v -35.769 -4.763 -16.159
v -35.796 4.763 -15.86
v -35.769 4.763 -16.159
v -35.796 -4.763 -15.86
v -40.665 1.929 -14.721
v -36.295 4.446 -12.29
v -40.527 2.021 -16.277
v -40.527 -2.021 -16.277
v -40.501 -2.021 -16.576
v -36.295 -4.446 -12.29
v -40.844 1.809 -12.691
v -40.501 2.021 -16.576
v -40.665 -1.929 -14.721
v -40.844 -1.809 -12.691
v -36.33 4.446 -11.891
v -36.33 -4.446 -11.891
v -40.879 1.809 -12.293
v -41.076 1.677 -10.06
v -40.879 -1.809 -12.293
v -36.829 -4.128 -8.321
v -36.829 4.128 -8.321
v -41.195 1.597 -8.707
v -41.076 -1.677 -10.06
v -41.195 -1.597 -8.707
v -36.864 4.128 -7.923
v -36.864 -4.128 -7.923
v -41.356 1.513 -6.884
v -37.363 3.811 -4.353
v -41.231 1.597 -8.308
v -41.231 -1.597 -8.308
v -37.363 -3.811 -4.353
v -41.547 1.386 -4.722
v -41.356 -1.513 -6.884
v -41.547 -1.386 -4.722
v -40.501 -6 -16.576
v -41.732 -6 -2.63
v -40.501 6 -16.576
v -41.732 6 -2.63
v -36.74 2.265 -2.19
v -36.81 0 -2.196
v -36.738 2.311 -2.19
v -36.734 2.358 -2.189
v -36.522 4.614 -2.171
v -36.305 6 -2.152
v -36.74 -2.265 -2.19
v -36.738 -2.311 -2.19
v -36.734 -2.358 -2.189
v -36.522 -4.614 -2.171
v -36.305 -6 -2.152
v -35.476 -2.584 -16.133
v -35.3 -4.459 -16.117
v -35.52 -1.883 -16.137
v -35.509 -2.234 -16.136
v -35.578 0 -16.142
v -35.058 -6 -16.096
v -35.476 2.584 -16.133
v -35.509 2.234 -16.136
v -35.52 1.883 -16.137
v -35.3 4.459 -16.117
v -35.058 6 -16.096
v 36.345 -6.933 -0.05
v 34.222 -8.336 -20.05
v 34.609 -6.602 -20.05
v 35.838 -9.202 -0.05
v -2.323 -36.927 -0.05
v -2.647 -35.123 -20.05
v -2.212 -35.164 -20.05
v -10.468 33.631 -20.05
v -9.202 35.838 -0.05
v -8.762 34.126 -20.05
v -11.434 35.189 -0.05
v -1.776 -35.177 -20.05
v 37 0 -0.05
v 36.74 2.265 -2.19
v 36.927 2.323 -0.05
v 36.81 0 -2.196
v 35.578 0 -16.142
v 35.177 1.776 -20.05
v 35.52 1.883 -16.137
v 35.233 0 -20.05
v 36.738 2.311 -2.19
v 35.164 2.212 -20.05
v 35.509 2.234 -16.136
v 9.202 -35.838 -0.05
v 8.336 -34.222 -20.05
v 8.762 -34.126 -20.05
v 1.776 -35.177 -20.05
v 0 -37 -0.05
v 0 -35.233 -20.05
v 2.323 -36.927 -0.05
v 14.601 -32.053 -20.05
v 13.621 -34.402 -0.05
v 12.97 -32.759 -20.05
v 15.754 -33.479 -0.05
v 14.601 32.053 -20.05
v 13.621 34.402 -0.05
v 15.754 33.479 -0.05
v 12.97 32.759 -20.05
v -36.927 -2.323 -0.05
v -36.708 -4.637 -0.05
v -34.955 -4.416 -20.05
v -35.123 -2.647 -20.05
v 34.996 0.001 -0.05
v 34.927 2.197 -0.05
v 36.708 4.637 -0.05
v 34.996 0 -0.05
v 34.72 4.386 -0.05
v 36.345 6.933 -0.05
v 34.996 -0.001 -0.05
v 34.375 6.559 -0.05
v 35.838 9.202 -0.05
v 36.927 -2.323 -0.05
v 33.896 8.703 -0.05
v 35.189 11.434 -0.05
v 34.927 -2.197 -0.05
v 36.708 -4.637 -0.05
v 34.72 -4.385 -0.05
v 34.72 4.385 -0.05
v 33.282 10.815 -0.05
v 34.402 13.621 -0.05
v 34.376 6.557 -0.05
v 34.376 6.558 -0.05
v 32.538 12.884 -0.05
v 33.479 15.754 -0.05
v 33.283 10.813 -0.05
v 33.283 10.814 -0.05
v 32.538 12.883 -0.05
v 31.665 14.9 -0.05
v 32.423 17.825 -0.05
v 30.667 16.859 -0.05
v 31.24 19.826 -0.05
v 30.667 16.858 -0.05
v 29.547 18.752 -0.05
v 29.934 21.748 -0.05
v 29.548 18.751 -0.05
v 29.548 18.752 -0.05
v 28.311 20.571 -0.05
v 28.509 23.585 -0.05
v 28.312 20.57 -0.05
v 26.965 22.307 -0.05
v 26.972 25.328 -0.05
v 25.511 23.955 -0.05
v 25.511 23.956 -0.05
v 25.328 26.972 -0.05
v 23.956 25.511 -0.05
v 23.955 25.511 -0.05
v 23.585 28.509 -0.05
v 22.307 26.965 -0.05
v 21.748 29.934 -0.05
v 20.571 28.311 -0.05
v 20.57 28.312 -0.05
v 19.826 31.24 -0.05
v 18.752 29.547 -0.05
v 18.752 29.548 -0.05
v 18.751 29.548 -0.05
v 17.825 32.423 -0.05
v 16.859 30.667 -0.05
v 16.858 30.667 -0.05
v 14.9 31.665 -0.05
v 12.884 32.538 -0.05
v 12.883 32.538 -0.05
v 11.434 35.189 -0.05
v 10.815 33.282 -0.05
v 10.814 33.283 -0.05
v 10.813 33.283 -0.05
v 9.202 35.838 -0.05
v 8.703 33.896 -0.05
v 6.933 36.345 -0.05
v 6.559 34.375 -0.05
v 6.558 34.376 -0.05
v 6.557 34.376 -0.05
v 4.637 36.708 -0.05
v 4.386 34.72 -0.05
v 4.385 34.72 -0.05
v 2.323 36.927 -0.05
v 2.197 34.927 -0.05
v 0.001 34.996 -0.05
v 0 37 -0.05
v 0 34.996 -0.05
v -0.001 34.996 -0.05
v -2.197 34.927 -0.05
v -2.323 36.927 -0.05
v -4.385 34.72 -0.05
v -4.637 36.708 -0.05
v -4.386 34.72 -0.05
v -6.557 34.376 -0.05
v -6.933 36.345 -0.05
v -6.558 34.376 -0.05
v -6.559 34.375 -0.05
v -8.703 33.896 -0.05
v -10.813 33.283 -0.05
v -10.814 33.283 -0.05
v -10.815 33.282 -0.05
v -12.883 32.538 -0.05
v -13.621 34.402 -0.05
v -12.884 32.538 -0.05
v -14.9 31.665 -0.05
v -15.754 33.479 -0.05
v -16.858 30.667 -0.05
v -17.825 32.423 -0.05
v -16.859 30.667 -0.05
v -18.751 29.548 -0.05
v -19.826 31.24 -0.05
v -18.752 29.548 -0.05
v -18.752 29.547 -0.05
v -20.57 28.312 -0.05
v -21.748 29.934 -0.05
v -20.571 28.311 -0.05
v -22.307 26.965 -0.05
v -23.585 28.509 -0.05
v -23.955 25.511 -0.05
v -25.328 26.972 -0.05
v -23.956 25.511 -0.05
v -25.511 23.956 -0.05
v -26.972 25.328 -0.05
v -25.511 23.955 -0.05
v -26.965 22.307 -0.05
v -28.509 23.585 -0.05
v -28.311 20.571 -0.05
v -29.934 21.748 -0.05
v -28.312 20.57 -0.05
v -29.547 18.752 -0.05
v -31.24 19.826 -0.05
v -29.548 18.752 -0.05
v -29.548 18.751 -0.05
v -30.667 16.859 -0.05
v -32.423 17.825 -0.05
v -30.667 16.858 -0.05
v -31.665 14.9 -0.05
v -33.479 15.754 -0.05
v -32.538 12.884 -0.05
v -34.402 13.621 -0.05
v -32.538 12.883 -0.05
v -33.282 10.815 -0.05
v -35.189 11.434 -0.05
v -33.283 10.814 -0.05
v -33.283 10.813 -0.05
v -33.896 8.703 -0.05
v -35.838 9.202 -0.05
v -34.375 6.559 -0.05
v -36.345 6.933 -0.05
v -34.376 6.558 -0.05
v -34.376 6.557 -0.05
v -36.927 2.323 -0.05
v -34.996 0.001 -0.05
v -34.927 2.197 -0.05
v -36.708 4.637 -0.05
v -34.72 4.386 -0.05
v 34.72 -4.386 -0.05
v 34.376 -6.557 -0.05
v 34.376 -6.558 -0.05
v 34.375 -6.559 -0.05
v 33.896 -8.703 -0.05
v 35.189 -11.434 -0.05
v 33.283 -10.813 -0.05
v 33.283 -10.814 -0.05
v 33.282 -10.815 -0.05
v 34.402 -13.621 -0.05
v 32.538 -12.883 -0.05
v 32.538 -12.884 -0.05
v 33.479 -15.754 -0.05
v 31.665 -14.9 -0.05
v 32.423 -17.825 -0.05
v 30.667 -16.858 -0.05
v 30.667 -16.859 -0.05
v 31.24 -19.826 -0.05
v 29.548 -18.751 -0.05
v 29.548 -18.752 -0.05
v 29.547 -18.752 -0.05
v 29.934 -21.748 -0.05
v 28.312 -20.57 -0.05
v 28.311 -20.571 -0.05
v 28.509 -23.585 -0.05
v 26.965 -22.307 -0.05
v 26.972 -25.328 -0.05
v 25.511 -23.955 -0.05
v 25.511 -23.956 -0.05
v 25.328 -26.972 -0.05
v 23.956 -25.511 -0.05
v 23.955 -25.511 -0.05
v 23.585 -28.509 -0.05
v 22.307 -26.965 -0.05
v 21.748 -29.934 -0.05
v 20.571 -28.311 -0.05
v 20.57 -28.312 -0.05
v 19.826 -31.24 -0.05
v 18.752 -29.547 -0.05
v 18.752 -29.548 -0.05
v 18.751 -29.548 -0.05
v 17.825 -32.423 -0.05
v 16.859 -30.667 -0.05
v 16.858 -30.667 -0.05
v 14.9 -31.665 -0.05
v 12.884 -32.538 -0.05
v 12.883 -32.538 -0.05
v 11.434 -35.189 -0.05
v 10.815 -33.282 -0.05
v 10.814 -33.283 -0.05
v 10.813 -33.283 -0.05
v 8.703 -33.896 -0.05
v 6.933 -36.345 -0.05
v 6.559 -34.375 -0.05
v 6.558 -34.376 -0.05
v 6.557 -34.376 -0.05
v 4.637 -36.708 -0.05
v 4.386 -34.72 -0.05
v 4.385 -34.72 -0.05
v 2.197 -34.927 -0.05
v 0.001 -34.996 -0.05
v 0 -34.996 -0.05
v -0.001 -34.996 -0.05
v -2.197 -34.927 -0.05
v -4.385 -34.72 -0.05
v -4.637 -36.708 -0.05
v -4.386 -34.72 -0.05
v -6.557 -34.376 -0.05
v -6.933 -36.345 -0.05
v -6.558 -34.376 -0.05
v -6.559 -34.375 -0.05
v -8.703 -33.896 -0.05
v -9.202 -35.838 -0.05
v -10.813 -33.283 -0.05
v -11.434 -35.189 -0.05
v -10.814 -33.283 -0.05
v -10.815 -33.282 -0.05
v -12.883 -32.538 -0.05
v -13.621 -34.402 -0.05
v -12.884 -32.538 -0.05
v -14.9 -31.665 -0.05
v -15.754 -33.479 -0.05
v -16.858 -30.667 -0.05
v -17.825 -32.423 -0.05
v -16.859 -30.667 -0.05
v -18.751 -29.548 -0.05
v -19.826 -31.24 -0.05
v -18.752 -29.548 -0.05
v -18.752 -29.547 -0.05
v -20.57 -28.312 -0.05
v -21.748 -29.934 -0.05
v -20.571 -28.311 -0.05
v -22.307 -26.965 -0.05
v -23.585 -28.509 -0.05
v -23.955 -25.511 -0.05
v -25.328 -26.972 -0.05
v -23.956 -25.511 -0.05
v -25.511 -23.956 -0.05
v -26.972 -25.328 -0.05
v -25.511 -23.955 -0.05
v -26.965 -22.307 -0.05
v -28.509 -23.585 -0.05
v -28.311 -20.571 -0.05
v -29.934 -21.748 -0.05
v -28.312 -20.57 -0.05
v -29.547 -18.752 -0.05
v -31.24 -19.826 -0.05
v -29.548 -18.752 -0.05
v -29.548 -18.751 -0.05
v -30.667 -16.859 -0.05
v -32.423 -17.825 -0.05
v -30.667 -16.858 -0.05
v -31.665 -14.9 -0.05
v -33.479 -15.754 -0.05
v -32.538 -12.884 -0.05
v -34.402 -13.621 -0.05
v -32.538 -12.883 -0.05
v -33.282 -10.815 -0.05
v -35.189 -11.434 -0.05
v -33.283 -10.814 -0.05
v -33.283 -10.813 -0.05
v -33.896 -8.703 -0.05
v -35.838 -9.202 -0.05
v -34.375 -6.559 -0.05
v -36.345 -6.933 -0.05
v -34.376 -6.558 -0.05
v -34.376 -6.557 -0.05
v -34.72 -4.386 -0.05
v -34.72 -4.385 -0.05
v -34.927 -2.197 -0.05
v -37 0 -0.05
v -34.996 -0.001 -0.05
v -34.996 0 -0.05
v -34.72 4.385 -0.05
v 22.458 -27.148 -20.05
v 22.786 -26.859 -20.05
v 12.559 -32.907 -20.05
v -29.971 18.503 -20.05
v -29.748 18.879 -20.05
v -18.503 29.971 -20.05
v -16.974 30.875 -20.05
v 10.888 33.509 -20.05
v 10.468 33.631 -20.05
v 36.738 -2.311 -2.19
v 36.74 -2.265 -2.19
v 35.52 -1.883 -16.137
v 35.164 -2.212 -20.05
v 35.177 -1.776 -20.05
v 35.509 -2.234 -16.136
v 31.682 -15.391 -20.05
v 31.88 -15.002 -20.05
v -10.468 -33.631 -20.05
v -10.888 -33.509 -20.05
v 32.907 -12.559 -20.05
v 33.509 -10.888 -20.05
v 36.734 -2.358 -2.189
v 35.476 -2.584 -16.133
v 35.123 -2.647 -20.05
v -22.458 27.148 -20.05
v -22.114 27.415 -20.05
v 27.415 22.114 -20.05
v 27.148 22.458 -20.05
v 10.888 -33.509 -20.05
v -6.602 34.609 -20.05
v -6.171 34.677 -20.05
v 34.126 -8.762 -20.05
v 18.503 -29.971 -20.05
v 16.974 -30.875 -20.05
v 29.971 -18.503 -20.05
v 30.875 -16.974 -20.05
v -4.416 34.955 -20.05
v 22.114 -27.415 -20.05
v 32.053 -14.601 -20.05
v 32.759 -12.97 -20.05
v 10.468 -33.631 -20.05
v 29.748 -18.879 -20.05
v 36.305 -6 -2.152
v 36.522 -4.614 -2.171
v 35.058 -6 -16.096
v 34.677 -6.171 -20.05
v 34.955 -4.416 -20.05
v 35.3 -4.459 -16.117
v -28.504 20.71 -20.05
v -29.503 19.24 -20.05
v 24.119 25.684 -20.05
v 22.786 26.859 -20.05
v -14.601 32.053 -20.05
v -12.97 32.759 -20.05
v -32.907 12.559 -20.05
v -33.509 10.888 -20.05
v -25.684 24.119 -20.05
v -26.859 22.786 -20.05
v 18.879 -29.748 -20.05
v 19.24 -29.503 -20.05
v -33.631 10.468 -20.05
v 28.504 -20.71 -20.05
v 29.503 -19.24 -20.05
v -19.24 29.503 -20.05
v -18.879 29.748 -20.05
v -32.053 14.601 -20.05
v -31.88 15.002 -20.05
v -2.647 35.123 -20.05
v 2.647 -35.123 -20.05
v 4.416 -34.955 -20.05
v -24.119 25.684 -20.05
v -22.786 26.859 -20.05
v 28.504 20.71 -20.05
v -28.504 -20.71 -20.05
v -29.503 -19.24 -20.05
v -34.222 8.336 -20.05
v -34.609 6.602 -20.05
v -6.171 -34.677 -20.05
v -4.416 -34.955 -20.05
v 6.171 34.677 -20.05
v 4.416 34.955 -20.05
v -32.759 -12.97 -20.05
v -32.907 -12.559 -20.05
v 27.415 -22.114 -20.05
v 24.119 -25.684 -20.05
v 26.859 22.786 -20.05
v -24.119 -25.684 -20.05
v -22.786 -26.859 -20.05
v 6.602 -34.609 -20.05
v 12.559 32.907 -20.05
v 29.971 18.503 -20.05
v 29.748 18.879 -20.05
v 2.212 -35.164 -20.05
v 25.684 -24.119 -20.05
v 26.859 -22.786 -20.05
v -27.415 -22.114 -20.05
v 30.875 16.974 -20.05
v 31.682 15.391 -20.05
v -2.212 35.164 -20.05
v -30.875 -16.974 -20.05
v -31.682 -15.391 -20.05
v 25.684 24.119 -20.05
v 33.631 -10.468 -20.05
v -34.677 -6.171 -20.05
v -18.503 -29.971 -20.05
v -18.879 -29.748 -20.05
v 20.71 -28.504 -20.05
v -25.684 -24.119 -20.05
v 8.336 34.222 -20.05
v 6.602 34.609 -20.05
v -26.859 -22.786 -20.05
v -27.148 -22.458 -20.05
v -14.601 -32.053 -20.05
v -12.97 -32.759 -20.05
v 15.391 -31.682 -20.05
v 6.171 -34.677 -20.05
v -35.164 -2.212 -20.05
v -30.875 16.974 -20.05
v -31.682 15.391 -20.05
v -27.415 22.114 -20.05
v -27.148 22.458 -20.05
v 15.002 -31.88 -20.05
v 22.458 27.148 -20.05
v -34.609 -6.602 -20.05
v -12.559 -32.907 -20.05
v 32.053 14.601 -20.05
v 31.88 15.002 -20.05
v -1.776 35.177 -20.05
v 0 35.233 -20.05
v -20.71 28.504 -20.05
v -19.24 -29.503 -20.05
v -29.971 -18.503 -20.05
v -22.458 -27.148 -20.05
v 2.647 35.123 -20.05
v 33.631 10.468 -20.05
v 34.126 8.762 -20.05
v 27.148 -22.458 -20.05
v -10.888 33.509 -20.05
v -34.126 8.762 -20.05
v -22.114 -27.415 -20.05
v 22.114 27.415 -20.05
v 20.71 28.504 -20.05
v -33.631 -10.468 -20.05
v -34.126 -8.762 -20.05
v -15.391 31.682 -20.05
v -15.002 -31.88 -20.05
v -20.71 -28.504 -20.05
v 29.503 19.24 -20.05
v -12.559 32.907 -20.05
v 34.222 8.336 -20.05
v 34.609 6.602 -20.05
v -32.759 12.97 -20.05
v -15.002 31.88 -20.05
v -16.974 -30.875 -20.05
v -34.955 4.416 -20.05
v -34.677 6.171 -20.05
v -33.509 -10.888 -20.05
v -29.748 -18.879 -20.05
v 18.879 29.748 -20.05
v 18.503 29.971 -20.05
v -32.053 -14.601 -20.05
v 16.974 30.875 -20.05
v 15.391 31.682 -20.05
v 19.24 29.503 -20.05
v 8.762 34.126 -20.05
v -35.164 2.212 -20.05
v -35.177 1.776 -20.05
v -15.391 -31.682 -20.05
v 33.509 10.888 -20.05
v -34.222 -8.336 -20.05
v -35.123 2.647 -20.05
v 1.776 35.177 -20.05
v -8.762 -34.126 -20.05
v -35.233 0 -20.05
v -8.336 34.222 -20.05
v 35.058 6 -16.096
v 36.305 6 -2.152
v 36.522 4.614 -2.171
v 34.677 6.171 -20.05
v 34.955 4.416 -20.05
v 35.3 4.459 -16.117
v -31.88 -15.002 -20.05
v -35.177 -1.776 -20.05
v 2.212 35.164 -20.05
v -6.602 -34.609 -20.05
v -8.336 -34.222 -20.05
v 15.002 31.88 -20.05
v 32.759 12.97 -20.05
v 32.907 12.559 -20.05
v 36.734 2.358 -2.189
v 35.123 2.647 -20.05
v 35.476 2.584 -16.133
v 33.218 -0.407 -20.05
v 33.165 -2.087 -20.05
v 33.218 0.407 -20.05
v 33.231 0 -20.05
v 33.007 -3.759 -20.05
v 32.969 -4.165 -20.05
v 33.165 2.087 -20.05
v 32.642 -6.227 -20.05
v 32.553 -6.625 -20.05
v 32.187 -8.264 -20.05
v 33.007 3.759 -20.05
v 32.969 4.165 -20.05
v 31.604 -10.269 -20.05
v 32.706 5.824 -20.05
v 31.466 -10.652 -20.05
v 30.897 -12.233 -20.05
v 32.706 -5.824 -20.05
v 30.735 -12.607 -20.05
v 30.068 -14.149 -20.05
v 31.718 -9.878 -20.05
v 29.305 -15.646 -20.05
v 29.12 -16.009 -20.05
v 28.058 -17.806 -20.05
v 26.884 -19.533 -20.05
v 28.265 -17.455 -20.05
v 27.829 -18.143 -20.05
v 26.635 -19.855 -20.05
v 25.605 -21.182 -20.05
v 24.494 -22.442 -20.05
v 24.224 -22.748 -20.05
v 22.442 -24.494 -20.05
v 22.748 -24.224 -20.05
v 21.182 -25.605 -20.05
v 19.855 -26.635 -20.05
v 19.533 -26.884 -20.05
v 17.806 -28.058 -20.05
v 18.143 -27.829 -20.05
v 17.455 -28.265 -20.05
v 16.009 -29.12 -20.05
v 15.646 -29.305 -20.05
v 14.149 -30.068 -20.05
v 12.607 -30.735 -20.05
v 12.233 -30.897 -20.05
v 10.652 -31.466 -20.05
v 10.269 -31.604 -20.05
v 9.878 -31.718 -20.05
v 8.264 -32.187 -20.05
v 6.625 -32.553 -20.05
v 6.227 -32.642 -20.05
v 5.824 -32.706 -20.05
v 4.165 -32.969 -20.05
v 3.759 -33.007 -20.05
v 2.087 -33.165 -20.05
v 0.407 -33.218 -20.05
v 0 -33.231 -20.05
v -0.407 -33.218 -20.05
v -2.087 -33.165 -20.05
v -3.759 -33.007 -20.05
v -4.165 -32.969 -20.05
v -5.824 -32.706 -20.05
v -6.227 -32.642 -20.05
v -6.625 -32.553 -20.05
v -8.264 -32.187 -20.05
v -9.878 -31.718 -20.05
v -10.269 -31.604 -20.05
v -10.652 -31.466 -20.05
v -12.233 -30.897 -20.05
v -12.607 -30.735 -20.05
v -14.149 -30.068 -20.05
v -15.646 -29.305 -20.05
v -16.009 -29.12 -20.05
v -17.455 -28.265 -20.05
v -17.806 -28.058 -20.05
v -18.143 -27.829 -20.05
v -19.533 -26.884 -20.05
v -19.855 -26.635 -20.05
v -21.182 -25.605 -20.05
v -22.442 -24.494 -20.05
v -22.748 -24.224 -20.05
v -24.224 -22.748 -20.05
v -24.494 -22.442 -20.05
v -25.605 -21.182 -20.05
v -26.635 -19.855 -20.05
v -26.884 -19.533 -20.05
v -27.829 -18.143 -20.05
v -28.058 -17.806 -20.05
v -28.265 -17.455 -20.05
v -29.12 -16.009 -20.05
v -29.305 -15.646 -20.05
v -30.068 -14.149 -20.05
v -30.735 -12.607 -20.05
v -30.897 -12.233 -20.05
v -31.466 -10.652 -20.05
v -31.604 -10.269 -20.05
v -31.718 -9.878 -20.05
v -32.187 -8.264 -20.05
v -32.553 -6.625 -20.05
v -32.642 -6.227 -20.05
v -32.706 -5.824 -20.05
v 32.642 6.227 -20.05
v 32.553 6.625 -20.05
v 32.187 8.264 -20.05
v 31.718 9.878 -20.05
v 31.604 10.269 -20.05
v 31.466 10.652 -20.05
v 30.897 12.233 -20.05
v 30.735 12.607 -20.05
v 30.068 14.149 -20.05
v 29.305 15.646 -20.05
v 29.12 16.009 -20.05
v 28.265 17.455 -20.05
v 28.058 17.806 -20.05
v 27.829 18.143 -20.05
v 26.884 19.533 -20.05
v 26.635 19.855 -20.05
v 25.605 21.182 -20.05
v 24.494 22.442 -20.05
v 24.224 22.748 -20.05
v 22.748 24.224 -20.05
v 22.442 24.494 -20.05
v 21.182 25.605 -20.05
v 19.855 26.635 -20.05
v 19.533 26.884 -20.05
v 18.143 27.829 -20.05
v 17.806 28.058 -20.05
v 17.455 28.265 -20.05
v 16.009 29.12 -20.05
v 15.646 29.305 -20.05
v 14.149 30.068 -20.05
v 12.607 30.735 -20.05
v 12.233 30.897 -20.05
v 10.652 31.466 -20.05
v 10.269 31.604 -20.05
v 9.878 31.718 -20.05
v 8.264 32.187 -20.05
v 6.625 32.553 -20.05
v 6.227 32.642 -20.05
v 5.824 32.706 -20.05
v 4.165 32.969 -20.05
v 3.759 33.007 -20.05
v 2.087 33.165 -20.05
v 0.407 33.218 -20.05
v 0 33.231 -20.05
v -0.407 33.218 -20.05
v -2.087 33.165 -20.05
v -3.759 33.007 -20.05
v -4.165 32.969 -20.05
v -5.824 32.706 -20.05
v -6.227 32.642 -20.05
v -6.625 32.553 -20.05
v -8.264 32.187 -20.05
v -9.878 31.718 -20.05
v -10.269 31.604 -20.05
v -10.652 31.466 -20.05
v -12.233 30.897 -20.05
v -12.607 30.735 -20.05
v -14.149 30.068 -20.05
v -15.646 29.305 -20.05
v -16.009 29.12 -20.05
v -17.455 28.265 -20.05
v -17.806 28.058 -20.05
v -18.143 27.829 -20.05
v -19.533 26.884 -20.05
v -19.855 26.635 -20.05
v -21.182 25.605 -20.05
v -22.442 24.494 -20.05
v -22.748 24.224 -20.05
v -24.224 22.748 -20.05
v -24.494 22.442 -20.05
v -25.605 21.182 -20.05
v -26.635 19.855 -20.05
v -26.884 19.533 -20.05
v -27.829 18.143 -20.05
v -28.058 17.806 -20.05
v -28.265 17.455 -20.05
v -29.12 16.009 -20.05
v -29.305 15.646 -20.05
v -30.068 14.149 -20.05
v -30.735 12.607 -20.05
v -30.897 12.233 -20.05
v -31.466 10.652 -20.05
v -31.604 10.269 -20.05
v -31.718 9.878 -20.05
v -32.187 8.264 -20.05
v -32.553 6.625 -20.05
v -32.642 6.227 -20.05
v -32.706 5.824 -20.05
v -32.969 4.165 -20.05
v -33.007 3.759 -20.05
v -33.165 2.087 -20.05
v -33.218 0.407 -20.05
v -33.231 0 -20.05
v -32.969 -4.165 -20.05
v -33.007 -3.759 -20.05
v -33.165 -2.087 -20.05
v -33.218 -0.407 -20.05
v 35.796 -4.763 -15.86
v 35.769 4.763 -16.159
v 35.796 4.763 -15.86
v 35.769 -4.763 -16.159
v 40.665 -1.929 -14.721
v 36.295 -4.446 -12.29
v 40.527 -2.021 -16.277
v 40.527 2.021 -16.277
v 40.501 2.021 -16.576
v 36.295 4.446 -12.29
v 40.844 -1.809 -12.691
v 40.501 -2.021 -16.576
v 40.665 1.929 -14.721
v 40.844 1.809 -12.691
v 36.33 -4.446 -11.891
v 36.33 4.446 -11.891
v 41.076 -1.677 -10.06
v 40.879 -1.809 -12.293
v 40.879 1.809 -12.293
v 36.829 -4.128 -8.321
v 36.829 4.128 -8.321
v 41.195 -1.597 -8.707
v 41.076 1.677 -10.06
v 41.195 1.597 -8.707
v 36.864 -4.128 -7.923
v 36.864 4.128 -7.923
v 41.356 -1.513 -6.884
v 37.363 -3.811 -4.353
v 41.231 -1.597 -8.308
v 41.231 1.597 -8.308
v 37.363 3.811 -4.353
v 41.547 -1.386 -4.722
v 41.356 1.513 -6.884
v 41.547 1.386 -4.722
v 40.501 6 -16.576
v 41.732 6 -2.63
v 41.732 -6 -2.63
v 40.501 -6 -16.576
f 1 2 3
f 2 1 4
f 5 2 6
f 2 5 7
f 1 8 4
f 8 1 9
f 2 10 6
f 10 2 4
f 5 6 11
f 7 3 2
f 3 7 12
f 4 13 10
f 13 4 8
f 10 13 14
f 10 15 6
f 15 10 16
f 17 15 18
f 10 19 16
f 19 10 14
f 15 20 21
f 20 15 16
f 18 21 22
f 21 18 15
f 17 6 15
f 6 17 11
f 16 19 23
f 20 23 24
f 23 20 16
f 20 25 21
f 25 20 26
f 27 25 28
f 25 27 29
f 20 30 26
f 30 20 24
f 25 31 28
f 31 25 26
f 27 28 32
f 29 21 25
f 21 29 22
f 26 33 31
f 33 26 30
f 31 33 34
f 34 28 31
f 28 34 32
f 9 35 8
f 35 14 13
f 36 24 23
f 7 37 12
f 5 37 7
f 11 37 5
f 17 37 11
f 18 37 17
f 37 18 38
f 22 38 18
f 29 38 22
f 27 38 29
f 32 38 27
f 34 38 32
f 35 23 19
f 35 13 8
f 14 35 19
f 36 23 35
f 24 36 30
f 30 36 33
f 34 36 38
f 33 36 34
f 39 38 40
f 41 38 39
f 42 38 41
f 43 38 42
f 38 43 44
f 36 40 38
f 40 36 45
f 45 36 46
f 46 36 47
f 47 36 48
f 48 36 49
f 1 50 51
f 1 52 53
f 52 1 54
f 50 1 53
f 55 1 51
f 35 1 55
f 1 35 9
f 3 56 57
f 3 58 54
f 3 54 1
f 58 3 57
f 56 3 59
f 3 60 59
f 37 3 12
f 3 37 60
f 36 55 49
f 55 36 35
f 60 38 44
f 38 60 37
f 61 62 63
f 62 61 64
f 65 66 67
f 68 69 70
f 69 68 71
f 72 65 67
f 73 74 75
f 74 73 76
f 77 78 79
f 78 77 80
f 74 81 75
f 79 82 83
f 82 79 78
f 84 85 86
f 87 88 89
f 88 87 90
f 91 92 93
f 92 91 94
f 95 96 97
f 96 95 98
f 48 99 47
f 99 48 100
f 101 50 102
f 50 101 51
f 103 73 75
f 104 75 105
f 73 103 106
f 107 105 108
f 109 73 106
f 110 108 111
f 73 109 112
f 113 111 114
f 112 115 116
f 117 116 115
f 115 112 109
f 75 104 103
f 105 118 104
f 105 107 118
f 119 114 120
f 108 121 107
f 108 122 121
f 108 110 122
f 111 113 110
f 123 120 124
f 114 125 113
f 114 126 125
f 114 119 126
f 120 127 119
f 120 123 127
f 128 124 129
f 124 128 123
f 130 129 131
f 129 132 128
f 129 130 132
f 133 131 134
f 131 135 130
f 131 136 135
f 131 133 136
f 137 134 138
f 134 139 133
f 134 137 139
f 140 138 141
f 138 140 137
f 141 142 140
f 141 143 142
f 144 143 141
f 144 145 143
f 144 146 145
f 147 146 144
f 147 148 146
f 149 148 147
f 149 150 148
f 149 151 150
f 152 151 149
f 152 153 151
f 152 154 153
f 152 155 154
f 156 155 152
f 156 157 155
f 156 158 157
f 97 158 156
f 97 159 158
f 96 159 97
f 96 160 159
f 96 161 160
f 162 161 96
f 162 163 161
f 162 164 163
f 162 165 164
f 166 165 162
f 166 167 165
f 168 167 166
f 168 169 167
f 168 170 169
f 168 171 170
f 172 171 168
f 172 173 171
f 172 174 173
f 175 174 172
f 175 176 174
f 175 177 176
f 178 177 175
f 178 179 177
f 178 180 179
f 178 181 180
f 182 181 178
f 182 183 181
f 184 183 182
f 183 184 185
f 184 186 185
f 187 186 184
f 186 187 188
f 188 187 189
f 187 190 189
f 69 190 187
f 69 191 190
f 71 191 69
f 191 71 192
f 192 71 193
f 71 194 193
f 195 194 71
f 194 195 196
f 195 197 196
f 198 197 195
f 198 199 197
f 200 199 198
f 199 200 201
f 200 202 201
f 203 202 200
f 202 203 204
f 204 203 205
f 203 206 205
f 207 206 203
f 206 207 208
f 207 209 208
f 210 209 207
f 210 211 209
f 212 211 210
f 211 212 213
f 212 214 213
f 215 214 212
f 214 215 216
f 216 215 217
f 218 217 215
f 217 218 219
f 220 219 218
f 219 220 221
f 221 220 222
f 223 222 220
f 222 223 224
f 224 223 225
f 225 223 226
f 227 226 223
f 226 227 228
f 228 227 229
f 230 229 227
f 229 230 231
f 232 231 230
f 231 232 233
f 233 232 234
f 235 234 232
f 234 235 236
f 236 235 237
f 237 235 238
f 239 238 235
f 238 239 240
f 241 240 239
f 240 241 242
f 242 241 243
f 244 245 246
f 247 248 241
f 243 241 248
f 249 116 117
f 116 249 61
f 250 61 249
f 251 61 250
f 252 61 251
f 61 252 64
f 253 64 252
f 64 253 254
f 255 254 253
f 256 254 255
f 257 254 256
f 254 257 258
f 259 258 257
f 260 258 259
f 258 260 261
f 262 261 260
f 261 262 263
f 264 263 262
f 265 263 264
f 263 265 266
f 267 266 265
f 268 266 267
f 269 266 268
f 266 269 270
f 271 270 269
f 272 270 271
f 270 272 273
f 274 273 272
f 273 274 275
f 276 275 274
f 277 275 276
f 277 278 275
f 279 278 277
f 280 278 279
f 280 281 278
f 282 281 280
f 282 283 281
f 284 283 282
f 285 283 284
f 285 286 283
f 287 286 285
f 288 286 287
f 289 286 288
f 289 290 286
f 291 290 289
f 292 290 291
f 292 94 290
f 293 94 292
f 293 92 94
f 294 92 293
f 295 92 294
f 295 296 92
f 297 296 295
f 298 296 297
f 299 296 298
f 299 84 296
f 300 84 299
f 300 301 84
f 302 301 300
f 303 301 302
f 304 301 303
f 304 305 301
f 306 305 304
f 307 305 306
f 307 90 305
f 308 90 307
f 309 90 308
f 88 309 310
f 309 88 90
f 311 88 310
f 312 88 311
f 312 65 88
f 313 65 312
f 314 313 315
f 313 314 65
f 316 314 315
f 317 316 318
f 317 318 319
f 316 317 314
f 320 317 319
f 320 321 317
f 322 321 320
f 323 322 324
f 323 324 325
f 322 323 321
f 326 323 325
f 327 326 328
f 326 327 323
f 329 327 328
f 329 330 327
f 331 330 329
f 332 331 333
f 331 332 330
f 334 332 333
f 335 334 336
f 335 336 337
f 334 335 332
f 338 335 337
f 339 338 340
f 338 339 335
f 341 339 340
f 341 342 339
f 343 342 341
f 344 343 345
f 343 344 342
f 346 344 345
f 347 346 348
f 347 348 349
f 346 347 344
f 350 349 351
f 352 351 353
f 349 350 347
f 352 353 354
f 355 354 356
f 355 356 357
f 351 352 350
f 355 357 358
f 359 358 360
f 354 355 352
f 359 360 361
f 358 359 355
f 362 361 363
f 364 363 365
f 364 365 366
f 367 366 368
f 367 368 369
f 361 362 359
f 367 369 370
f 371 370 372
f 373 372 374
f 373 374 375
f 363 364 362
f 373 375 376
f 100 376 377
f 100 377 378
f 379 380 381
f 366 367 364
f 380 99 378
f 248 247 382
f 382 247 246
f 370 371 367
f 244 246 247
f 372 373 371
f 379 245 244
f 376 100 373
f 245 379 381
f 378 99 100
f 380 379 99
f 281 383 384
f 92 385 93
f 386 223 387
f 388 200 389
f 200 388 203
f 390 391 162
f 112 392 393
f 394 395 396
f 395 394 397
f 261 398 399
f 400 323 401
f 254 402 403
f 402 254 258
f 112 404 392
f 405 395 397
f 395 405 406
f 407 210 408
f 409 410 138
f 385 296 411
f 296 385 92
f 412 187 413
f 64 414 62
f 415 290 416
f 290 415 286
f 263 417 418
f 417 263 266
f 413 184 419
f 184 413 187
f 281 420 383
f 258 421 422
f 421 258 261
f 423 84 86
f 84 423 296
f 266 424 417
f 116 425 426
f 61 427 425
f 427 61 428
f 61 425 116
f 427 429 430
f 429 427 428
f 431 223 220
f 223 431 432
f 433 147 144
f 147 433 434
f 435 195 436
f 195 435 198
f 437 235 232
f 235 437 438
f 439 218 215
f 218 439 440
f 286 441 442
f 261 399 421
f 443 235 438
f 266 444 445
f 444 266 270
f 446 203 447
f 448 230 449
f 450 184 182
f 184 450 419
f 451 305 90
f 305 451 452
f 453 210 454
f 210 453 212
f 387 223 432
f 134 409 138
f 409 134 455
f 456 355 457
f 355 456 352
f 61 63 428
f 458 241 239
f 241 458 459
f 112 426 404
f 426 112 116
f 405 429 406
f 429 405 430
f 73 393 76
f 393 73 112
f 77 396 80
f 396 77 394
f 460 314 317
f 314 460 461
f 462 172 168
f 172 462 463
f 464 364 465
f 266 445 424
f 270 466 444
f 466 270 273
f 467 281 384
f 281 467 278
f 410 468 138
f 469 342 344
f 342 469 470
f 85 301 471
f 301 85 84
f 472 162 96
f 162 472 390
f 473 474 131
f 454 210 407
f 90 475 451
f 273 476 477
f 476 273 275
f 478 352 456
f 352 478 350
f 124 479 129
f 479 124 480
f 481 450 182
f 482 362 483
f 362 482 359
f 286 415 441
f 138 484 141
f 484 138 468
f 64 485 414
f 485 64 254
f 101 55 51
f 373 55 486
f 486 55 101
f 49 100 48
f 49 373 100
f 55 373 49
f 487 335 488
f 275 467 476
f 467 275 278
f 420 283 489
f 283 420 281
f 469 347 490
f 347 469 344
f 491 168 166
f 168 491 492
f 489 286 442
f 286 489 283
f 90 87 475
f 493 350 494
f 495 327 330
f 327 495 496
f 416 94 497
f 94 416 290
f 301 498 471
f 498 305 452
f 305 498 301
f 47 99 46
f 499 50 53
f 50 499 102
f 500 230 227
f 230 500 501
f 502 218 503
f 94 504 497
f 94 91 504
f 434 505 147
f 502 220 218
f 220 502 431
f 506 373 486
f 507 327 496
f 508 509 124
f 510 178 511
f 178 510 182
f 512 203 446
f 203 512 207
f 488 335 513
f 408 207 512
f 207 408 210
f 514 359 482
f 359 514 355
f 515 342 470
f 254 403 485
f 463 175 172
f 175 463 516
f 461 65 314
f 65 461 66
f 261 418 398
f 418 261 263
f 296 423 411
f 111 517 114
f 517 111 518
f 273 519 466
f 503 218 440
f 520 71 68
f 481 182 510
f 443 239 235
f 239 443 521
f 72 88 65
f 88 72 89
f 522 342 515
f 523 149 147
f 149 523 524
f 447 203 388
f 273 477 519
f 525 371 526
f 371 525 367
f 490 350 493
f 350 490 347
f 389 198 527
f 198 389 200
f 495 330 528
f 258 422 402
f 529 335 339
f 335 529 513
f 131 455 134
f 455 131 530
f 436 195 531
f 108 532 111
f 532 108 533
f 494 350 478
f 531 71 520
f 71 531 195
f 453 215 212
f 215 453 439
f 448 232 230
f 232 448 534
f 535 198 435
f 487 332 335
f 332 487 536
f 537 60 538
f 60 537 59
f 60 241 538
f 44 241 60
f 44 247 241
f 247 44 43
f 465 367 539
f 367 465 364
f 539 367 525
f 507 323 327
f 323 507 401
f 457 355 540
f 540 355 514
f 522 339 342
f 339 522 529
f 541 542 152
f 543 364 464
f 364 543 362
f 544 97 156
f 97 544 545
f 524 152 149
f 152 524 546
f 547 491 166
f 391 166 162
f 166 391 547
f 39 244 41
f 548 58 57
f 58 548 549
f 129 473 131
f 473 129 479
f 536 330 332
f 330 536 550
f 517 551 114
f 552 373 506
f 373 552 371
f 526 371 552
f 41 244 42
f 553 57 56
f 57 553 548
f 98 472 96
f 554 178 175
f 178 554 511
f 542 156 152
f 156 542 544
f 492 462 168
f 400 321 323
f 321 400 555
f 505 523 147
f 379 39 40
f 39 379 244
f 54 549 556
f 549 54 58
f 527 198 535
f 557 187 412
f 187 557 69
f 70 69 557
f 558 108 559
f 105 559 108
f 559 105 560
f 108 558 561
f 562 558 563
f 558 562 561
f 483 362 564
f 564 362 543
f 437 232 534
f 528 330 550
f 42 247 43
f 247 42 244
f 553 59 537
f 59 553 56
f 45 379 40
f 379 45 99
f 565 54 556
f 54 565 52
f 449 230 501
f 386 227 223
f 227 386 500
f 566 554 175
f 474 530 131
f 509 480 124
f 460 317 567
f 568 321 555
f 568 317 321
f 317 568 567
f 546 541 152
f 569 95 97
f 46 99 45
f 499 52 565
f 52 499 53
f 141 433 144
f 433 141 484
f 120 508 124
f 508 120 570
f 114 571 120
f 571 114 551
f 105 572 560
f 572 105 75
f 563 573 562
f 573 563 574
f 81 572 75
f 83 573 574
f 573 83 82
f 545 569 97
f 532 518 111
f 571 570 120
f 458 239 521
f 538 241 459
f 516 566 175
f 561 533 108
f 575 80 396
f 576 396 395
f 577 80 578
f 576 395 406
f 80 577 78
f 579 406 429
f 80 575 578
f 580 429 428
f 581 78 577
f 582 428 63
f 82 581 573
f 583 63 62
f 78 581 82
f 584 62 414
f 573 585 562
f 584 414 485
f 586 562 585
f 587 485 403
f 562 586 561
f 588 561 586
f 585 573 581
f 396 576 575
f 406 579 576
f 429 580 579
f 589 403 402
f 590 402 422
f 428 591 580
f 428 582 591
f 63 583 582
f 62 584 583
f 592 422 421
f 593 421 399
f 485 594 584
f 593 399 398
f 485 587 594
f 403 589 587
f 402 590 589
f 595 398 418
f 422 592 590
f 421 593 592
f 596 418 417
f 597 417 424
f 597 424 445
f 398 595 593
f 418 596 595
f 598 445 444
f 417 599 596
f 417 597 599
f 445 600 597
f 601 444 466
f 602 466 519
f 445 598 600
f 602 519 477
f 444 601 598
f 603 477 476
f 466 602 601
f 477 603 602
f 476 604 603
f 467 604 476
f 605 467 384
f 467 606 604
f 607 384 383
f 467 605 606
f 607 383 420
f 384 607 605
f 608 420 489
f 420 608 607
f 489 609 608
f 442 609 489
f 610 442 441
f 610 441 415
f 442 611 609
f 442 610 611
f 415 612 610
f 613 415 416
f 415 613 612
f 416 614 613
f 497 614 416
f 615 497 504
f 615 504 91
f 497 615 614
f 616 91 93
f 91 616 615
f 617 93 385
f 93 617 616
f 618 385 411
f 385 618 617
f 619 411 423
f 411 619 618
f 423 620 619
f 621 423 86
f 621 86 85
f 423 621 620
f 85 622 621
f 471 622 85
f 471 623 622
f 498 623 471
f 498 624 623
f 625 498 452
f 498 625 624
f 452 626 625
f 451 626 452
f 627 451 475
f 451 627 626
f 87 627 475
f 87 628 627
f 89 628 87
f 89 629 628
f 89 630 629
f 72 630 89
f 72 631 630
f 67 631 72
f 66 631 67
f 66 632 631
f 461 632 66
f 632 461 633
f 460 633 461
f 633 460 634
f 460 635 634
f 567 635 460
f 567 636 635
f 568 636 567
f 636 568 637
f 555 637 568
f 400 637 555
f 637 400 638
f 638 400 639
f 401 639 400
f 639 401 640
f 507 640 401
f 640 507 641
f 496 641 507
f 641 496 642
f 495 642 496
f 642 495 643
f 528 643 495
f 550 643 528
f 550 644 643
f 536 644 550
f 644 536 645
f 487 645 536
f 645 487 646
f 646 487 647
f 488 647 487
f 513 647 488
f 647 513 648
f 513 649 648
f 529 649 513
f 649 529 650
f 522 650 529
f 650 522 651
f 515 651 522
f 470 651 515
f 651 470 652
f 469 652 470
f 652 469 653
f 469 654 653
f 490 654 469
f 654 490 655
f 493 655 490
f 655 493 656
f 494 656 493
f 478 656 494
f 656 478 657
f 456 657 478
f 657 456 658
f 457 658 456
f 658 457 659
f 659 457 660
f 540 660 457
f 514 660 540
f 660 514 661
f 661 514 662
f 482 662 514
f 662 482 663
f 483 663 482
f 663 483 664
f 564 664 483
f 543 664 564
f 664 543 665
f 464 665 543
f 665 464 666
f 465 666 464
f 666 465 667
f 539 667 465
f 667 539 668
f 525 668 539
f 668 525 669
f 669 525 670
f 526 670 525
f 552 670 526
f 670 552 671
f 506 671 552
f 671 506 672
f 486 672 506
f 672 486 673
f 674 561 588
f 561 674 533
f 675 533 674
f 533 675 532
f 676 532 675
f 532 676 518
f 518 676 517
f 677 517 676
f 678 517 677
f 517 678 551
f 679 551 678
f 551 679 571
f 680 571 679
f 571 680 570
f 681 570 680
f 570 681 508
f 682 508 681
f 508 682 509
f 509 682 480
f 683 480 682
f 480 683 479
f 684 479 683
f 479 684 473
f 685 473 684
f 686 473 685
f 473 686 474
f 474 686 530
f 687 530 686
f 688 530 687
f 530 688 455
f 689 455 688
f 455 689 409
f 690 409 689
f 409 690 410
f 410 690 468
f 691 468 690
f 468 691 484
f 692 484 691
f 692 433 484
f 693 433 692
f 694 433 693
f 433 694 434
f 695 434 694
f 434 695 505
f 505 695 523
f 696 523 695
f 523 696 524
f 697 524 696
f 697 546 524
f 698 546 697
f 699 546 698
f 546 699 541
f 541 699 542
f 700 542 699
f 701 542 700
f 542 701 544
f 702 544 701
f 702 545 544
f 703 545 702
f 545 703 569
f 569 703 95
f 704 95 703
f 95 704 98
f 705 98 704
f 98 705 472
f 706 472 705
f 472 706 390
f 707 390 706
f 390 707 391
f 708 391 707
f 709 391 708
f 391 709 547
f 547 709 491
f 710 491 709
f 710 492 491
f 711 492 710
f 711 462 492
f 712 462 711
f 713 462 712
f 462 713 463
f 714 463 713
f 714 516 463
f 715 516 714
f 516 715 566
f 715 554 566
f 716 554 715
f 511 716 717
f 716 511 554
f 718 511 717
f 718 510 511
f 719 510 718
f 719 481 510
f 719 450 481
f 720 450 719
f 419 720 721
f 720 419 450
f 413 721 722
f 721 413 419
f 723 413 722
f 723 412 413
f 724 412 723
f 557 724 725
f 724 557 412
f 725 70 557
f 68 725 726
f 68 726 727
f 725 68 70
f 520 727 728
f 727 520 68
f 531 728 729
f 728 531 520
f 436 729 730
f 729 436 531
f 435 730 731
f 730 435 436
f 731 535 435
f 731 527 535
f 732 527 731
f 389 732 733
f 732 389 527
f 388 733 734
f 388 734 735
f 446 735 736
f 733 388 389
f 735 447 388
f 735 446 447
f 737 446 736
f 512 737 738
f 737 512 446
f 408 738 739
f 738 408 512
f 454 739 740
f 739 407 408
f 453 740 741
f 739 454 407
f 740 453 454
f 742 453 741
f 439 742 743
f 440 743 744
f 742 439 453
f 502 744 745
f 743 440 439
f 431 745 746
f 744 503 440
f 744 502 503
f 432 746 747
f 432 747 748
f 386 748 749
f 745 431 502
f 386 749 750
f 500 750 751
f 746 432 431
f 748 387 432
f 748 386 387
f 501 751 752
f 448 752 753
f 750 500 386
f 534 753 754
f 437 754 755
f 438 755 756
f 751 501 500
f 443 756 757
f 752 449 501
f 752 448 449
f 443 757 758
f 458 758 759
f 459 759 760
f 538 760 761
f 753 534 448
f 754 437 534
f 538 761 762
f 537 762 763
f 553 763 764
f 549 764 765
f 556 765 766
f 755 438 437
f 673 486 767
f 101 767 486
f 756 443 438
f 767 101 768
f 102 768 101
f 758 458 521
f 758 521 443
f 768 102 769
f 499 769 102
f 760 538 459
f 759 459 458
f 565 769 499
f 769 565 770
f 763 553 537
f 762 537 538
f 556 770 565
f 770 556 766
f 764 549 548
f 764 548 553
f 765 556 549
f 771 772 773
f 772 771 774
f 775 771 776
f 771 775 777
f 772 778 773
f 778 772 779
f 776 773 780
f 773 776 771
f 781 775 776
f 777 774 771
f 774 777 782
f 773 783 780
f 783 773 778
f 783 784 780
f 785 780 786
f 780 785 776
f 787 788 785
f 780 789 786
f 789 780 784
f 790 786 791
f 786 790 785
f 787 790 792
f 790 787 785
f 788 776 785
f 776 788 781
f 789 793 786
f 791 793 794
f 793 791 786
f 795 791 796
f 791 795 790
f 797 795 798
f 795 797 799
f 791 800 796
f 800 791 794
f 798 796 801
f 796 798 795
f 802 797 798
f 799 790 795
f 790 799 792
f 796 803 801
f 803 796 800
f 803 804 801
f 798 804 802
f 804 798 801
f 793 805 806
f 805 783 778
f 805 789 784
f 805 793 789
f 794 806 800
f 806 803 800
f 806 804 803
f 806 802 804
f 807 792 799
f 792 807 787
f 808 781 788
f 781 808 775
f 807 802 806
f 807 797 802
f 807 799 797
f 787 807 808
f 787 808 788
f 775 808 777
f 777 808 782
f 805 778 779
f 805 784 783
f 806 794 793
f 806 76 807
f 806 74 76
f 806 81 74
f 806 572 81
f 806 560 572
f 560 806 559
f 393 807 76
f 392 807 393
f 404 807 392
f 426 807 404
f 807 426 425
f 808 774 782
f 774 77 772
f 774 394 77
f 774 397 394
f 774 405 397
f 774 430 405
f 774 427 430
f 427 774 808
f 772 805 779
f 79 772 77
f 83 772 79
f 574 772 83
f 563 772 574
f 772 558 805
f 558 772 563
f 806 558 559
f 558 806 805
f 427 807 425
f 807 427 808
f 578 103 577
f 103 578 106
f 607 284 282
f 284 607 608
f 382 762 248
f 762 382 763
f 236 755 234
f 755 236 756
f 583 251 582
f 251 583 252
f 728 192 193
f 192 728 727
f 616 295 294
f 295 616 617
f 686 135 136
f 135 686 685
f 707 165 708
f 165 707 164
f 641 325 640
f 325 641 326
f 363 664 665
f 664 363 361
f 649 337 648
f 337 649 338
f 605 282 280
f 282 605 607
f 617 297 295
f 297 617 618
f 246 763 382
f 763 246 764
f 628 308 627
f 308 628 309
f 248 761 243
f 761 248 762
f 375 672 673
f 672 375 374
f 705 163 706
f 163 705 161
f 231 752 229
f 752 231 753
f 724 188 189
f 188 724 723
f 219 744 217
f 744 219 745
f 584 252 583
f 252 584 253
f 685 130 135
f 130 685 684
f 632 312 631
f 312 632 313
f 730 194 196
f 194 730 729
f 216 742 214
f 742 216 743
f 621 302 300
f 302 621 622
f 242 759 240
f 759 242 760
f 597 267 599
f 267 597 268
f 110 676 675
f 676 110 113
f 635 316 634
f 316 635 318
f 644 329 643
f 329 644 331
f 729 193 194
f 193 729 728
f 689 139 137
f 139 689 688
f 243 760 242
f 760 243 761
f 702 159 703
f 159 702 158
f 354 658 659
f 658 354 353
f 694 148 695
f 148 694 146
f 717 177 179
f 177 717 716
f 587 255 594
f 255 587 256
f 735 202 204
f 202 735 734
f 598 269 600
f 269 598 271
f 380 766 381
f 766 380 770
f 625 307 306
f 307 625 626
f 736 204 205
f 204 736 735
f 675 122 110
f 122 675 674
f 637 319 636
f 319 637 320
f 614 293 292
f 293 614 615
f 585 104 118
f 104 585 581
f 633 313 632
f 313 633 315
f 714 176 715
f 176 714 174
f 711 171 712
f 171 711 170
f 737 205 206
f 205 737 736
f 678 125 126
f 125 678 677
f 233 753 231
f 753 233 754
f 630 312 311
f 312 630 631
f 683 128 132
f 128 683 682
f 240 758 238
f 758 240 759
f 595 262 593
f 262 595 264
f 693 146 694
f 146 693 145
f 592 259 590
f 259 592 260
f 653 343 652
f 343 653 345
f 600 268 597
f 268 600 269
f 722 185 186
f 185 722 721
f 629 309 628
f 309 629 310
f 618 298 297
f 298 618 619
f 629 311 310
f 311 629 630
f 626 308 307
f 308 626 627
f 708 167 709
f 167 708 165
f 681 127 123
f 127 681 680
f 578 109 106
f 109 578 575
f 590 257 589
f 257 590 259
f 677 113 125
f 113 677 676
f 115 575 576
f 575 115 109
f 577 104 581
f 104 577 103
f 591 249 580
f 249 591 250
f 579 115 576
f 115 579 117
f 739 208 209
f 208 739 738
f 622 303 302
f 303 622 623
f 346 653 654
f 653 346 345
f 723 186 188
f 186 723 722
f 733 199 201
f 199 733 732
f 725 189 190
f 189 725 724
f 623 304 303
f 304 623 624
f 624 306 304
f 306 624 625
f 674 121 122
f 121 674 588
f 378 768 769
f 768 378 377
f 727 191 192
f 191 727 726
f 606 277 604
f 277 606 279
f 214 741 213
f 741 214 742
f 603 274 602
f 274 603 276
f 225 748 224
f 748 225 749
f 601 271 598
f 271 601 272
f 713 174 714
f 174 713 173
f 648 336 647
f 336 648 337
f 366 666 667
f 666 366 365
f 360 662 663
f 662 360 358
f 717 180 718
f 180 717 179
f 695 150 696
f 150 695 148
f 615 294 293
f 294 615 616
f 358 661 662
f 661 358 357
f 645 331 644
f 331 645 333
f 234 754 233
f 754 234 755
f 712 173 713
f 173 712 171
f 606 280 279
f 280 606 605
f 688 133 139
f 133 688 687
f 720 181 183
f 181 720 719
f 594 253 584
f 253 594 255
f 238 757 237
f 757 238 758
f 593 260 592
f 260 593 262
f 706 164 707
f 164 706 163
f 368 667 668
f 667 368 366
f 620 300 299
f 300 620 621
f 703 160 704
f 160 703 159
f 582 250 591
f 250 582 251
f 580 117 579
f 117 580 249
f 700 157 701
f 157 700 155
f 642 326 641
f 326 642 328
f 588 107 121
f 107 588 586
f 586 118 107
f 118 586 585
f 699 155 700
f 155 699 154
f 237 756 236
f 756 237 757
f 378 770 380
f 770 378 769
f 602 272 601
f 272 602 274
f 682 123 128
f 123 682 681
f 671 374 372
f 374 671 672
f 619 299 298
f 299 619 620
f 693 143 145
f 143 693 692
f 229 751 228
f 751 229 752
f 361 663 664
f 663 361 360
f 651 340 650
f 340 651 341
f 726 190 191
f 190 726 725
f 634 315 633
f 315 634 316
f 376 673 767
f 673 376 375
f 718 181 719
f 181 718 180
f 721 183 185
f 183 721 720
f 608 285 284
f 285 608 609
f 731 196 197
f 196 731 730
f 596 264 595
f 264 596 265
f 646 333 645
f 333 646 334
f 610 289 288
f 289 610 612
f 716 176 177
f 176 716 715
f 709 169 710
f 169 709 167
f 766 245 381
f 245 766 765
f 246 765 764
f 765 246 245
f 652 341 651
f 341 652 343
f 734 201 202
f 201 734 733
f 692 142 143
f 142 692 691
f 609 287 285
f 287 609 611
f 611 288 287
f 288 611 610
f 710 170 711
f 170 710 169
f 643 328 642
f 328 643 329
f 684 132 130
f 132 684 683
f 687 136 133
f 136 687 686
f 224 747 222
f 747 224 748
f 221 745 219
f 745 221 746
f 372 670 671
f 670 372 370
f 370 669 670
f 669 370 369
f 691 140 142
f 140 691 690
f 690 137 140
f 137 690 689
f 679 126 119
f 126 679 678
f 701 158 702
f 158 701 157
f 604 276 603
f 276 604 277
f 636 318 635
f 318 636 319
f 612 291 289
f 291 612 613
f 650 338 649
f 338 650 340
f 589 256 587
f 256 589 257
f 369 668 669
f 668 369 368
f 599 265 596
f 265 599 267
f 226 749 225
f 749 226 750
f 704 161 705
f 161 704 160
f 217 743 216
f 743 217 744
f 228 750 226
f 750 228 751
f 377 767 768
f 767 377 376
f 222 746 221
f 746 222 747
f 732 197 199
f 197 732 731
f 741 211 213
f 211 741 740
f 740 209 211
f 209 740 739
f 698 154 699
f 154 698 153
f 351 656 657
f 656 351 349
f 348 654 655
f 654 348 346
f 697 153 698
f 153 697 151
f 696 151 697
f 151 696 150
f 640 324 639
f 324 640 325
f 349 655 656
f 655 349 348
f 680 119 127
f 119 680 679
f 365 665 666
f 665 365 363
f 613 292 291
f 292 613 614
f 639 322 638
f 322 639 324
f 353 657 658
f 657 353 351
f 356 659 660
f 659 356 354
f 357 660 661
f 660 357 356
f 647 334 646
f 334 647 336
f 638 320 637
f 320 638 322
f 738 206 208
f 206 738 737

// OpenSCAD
// Customizable Moose Cup Holder 
// by edak

//CUSTOMIZER VARIABLES
/* [Basic Options] */
// Cup top diameter (mm)
cup_top=70;
// Cup bottom diameter (mm)
cup_bottom=55;
// Cup height (mm)
cup_height=85;
// Show cup holder/ring?
show_holder="yes";// [yes,no]
// Show antler?
show_antler1="yes";// [yes,no]
// Show antler?
show_antler2="yes";// [yes,no]


module tapered_extrude_children(scale1=10.0,scale2=1.0,height=10,twist=45,fn=32) {
  for(kid=[0:$children-1]) {
    for(i=[0:fn-1]) translate([0,0,height*i/fn]) {
      hull() {
        linear_extrude(height=height/fn/10) scale(scale1*(fn-i)/fn+scale2*i/fn) child(kid);
        translate([0,0,height/fn-height/fn/10])
          linear_extrude(height=height/fn/10) scale(scale1*(fn-i-1)/fn+scale2*(i+1)/fn) child(kid);
      } // hull
    } // for each slice
  } // for each child
} // module

module cup() {
   translate([0,0,-cup_height/2]) cylinder(cup_height, cup_bottom/2,cup_top/2,true, $fn=100);
} // visualise the cup so we can subtract it such that it fits snugly
    

module slot() {   
    translate([-(cup_top/2 + 3.5),0,-16.5]) rotate([0,atan(((cup_top - cup_bottom)/2)/cup_height),180]) difference(){  
        translate([-5,-6,0.1]) cube([7,12,14])   ;
        tapered_extrude_children(scale1=1,scale2=0.8,height=12,fn=3) {
            circle(5.5,$fn=3);
        }          
    }
} // needed some slots so made a box and took a tapered section out

module holder() {
    difference(){
        union(){
            intersection(){
                translate([0,0,-(cup_height/2)]) cylinder((cup_height-0.1), (cup_bottom+4)/2,(cup_top+4)/2,true, $fn=100);
                translate([0,0,-10]) cylinder(20.1,cup_top,cup_top,true);
            }
            slot();
            rotate([0,0,180]) slot();
        }
        cup();
    }
}

module antler() {
    difference(){
        translate([-((0.5*cup_top)+105),0,-13.8]) rotate([90,10,0]) scale([0.115,0.115,1]) linear_extrude(height = 8, center = true, convexity = 10) import("antler.dxf",convexity = 1);
        scale([1,0.95,1]) slot();
        holder(); //dont want to have the back end of the antler in the cup or holder!
        cup();
    }
}
   
   
if(show_antler1=="yes") antler();
if(show_antler2=="yes") rotate([0,0,180]) antler(); 
if(show_holder=="yes") holder();
//#cup();

   
